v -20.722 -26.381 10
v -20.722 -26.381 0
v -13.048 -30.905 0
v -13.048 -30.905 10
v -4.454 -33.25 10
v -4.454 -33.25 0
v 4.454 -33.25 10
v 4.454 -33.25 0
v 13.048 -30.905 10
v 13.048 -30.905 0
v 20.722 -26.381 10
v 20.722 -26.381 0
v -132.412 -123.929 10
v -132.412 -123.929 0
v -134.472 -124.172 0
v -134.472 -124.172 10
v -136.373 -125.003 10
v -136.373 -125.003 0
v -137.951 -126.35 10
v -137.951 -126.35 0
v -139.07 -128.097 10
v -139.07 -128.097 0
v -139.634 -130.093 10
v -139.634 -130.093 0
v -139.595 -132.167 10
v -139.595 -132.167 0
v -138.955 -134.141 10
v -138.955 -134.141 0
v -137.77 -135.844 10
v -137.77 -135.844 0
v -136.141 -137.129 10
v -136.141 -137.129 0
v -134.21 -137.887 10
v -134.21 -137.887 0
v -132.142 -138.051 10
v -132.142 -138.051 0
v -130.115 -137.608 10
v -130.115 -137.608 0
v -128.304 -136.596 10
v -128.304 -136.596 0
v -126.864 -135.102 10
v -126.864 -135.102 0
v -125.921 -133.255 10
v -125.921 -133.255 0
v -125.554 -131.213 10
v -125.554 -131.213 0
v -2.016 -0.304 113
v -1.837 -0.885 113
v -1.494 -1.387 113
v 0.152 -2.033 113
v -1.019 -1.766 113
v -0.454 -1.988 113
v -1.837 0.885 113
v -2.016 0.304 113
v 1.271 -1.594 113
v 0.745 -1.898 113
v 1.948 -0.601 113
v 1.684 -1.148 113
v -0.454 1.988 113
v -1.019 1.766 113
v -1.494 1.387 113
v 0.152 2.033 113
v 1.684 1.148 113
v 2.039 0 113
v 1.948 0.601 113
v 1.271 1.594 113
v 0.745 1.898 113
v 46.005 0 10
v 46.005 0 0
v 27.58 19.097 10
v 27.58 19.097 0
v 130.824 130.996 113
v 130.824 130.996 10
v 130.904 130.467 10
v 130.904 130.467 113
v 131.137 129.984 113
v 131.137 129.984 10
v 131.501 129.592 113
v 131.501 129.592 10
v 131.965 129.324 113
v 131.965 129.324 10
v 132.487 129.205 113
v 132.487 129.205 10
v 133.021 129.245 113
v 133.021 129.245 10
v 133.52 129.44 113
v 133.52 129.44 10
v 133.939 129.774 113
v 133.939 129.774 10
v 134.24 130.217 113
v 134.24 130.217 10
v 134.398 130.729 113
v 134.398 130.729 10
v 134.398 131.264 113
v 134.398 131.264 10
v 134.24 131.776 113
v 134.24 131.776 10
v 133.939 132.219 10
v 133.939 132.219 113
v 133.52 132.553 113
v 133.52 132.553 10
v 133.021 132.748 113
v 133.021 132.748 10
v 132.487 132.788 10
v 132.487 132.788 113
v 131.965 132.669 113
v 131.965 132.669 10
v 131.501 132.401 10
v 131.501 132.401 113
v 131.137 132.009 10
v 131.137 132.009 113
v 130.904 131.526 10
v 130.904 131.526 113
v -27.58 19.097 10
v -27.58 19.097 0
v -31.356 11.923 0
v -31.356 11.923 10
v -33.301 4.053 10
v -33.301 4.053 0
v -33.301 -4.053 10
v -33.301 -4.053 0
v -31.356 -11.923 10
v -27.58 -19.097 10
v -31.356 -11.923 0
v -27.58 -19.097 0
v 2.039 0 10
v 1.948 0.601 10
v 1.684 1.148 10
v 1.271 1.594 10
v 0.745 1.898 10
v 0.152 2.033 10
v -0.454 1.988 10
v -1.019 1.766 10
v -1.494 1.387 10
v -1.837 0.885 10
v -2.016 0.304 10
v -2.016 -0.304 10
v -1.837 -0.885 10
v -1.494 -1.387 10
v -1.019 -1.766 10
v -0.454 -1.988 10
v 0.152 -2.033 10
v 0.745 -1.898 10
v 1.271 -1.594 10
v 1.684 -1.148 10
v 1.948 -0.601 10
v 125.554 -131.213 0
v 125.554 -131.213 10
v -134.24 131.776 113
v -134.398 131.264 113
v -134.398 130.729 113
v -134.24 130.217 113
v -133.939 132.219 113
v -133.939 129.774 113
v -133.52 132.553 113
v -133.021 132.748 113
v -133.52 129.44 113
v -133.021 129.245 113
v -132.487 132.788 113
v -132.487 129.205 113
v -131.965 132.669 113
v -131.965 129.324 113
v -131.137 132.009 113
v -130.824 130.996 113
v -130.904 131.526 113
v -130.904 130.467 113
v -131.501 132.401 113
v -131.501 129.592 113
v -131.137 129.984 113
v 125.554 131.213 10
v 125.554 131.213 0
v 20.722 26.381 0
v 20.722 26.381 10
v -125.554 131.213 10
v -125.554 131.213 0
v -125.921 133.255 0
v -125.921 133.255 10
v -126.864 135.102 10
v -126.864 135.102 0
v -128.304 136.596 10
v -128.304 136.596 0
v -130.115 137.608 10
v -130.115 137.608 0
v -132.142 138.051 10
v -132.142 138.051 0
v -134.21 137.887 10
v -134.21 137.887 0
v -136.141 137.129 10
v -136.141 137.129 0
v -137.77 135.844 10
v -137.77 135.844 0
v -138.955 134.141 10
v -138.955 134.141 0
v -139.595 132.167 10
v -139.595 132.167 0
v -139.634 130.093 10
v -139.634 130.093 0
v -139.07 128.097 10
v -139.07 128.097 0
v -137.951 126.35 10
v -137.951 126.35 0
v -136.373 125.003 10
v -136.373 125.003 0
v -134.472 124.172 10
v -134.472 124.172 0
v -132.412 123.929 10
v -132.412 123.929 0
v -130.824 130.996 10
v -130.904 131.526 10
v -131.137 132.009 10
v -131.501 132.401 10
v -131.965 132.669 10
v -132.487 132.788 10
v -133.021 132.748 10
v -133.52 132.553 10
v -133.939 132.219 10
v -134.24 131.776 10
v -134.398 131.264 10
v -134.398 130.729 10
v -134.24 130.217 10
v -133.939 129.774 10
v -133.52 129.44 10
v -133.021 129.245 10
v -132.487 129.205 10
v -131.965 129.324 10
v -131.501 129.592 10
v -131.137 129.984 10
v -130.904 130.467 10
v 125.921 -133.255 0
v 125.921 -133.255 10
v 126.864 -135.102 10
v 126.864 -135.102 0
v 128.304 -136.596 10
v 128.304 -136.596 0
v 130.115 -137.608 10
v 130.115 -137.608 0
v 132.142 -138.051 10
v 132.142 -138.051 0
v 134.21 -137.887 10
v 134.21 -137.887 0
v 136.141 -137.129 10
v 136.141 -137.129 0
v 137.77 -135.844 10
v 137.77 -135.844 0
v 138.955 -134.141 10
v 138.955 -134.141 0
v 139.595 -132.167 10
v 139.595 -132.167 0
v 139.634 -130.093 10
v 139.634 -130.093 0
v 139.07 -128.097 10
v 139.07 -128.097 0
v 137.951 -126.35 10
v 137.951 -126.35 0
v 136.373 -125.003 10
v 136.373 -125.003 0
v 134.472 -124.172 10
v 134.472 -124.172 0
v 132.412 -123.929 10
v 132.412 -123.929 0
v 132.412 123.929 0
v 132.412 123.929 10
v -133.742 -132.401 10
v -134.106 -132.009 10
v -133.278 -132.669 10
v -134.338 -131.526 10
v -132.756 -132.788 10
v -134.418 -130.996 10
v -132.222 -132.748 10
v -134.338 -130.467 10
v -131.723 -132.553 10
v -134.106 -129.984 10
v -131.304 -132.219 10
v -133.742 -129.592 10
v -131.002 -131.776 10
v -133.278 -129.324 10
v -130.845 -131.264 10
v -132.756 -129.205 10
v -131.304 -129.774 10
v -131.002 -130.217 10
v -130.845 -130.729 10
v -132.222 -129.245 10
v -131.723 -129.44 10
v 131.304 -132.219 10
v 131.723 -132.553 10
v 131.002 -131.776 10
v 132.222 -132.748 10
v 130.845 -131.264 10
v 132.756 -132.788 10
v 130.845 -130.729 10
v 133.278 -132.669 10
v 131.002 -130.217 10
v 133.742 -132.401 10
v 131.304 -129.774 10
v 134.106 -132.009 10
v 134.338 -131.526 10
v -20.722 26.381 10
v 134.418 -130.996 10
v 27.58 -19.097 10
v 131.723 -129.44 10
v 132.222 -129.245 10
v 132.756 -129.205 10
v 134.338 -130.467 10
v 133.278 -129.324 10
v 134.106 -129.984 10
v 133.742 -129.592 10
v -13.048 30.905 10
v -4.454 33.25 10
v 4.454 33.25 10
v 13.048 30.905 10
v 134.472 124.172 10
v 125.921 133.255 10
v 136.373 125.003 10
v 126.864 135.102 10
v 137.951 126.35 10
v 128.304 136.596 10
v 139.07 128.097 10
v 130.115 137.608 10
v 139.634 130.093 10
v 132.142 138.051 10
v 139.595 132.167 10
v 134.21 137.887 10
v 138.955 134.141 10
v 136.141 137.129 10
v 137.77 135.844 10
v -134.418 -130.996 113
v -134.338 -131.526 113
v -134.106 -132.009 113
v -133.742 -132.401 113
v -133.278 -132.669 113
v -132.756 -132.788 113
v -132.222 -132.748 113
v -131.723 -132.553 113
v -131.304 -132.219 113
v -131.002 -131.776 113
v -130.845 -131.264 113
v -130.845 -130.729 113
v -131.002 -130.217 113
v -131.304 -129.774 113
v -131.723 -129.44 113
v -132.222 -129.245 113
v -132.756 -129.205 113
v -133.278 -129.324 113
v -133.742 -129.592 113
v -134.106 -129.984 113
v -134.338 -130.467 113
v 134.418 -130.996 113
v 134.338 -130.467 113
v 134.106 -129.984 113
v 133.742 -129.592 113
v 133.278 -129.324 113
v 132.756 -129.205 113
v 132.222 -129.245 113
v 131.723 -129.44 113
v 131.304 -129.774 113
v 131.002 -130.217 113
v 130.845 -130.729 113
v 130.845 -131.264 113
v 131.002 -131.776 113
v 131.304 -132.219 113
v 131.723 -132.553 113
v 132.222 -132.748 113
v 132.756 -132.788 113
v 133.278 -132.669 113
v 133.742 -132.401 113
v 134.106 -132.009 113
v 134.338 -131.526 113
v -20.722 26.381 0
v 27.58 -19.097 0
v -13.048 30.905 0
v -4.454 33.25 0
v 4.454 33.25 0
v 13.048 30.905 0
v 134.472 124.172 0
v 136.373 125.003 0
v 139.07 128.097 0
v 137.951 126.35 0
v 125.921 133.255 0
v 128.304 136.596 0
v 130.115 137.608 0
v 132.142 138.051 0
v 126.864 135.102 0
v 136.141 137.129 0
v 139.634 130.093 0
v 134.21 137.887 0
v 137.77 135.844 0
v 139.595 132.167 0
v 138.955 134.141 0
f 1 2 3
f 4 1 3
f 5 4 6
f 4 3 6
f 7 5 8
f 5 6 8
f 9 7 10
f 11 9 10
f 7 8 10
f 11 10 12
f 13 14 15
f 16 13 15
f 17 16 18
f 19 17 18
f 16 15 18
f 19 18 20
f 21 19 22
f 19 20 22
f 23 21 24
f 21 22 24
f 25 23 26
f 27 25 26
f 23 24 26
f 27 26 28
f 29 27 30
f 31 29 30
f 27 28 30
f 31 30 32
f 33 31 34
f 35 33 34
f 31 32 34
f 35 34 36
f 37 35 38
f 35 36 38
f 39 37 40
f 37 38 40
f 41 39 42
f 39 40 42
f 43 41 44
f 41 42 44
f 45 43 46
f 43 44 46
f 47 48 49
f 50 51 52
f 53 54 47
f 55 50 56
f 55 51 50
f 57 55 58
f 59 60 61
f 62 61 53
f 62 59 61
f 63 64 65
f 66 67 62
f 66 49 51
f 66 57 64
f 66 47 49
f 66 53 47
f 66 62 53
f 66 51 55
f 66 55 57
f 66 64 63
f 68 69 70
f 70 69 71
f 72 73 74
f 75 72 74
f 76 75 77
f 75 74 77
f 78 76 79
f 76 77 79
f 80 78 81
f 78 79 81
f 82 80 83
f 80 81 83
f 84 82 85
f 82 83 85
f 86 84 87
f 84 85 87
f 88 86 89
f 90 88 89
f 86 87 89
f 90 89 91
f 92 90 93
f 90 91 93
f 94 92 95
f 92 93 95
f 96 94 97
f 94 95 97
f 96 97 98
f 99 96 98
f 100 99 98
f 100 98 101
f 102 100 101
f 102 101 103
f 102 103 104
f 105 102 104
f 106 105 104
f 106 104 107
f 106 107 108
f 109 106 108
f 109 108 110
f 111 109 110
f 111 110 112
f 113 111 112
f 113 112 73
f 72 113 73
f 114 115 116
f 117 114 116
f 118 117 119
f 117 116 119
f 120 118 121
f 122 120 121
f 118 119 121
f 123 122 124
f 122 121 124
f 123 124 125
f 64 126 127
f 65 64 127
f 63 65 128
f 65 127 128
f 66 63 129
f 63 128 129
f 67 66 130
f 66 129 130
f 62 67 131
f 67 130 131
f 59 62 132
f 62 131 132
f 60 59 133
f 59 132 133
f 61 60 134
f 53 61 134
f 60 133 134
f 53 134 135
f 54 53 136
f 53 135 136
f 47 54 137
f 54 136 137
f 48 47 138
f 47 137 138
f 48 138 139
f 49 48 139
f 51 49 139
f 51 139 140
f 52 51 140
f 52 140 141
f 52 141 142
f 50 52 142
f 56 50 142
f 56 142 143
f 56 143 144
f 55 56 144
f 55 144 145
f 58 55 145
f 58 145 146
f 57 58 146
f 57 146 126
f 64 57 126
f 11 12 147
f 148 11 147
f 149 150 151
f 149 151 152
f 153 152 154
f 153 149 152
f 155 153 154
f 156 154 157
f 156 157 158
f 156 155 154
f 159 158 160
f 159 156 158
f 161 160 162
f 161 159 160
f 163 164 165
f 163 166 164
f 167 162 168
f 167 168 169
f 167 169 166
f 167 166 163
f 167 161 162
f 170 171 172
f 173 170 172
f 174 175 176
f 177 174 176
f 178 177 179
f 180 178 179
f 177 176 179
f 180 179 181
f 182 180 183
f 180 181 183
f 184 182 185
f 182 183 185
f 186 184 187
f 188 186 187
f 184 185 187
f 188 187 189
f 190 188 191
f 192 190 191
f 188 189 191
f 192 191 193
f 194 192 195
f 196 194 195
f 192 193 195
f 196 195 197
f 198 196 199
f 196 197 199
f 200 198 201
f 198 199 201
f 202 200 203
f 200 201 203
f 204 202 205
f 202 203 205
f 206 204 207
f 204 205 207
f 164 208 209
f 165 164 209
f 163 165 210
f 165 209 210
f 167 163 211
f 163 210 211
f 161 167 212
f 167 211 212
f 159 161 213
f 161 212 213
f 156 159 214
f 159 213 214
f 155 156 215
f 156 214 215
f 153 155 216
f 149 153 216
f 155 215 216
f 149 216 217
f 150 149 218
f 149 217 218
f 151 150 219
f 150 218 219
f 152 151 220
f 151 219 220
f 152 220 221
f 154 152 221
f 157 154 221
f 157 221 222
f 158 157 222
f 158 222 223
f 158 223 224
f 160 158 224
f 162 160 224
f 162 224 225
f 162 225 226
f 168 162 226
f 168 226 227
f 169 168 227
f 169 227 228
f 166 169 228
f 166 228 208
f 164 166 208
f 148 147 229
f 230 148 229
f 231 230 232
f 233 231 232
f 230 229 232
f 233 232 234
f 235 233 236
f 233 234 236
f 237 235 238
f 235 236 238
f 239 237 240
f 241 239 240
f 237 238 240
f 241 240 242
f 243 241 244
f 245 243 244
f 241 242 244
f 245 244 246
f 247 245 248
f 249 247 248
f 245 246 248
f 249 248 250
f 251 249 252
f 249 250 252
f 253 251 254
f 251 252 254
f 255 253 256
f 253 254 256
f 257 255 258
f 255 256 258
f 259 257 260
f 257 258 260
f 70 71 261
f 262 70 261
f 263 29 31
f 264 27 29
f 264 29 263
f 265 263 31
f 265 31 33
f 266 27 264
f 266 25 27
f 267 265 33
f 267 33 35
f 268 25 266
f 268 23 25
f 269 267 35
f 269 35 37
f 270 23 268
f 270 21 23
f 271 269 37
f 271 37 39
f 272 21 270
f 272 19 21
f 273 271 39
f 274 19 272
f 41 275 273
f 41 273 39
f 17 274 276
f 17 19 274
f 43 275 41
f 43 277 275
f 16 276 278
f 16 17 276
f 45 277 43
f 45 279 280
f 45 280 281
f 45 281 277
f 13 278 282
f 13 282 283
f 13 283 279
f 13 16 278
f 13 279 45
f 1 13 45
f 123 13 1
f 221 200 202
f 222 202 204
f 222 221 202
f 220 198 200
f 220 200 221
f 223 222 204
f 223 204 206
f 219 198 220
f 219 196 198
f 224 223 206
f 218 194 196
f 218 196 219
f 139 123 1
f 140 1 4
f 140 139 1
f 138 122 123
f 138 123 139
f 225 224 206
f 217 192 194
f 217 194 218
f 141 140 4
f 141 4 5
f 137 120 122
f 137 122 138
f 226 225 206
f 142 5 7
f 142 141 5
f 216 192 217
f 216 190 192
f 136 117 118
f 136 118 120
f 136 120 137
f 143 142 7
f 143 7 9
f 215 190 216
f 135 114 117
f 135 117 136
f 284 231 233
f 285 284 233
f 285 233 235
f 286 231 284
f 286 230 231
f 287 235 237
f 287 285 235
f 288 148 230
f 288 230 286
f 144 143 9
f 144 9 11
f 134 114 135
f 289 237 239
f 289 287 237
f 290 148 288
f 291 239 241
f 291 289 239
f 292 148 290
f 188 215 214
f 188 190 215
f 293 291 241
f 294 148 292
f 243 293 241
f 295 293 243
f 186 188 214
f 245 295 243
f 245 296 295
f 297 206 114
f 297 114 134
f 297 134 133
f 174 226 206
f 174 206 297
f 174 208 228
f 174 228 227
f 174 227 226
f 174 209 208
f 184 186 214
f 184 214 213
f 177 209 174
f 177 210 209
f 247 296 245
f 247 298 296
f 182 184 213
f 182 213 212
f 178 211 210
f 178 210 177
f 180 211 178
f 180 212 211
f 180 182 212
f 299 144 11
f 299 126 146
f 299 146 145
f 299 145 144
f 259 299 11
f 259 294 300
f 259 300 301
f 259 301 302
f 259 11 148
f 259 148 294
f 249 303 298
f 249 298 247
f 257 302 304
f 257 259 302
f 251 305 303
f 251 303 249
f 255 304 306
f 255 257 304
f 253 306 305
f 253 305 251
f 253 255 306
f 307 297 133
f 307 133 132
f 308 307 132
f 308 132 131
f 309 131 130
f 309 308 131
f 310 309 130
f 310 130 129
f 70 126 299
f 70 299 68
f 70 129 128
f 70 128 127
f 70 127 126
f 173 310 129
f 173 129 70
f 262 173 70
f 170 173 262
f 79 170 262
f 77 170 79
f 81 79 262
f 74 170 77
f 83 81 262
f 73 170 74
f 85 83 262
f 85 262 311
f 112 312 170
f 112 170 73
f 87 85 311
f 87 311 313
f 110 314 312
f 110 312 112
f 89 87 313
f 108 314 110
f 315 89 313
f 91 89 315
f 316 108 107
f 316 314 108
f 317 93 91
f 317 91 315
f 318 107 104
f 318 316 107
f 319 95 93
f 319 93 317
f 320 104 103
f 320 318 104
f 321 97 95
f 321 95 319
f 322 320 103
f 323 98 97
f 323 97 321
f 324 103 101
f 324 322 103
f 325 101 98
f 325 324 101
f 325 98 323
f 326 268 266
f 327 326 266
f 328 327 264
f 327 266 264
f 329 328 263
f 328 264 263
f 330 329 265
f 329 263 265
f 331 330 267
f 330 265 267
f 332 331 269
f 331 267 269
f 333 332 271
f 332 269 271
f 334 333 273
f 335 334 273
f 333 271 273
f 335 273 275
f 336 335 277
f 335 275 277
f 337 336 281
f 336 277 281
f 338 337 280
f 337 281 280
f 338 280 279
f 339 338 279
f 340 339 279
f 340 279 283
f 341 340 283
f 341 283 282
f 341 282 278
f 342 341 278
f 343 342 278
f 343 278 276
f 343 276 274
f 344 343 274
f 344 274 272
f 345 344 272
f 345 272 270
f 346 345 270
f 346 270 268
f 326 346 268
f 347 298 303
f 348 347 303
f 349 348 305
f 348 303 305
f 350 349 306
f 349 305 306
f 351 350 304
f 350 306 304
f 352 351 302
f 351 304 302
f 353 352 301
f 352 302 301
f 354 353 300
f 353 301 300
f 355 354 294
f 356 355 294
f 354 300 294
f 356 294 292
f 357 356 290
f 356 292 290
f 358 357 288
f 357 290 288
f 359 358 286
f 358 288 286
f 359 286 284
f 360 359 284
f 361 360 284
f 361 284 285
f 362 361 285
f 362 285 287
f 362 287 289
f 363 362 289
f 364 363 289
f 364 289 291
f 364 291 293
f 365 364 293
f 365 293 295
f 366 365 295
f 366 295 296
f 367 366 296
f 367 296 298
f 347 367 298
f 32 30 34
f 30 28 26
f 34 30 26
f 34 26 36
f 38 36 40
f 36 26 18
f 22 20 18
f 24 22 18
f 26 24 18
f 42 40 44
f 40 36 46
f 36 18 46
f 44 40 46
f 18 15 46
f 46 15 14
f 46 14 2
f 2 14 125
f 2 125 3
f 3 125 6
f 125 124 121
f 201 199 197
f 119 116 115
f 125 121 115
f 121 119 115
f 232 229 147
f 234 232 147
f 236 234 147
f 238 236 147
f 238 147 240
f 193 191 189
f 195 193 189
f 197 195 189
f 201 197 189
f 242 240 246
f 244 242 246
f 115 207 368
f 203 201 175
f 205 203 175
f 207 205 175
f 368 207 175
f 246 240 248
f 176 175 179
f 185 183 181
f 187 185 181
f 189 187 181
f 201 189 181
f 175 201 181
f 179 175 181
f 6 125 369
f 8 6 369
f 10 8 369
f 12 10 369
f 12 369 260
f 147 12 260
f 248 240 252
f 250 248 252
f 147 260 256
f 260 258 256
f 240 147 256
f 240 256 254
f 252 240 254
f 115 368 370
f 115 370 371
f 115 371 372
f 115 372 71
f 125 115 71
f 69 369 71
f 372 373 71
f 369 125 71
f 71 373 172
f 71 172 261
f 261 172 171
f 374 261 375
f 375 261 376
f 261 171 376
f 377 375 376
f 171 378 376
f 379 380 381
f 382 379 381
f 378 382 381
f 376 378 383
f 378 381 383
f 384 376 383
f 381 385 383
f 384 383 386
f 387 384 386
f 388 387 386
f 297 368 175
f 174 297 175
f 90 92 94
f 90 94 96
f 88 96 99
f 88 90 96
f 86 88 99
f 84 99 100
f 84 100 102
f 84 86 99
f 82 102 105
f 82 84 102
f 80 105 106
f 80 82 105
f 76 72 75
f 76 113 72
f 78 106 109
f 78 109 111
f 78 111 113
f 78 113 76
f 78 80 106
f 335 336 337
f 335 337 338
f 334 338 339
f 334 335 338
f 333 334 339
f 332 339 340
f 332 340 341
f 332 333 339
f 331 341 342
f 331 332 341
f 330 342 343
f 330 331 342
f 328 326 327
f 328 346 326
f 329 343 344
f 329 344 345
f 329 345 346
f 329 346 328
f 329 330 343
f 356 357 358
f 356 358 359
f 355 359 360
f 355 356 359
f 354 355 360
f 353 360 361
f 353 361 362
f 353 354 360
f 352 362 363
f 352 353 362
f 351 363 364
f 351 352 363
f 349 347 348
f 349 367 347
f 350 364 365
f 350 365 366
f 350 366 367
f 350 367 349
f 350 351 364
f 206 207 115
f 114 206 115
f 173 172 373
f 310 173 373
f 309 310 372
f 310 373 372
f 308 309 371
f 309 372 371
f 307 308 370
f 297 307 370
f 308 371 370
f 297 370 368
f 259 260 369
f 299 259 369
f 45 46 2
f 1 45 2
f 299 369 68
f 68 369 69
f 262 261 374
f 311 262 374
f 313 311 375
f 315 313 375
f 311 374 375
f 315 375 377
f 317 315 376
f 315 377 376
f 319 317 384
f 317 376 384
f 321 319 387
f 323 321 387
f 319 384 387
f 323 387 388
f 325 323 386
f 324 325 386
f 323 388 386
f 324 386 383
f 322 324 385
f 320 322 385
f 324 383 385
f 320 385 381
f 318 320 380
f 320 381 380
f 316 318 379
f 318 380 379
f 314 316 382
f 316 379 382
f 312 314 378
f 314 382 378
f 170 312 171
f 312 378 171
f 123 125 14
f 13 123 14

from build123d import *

# Parameters (mm, degrees)
BOSS_EXTRUDE1_DEPTH = 10
SKETCH3_R           = 1.796885627
SKETCH3_R_2         = 2.038704301
BOSS_EXTRUDE2_DEPTH = 113


with BuildPart() as part:
    # Sketch2 → Boss-Extrude1 (new body)
    with BuildSketch(Plane.XY):
        with BuildLine():
            Line((-20.72228509, 26.381237071), (-125.55357923, 131.212531212))
            ThreePointArc((-125.55357923, 131.212531212), (-137.769587184, 135.843703419), (-132.41170091, 123.928517268))
            Line((-132.41170091, 123.928517268), (-27.580406769, 19.097223127))
            ThreePointArc((-27.580406769, 19.097223127), (-33.546725157, 0), (-27.580406769, -19.097223127))
            Line((-27.580406769, -19.097223127), (-132.41170091, -123.928517268))
            ThreePointArc((-132.41170091, -123.928517268), (-137.769587184, -135.843703419), (-125.55357923, -131.212531212))
            Line((-125.55357923, -131.212531212), (-20.72228509, -26.381237071))
            ThreePointArc((-20.72228509, -26.381237071), (0, -33.546725157), (20.72228509, -26.381237071))
            Line((20.72228509, -26.381237071), (125.55357923, -131.212531212))
            ThreePointArc((125.55357923, -131.212531212), (137.769587184, -135.843703419), (132.41170091, -123.928517268))
            Line((132.41170091, -123.928517268), (27.580406769, -19.097223127))
            Line((27.580406769, -19.097223127), (46.005003751, 0))
            Line((46.005003751, 0), (27.580406769, 19.097223127))
            Line((27.580406769, 19.097223127), (132.41170091, 123.928517268))
            ThreePointArc((132.41170091, 123.928517268), (137.769587184, 135.843703419), (125.55357923, 131.212531212))
            Line((125.55357923, 131.212531212), (20.72228509, 26.381237071))
            ThreePointArc((20.72228509, 26.381237071), (0, 33.546725157), (-20.72228509, 26.381237071))
        make_face()
    extrude(amount=BOSS_EXTRUDE1_DEPTH)

    # Sketch3 → Boss-Extrude2 (add)
    with BuildSketch(Plane.XY):
        with Locations((-132.621345525, 130.996476601)):
            Circle(SKETCH3_R)
        with Locations(Location((132.621345525, 130.996476601, 0), (0, 0, 180))):
            Circle(SKETCH3_R)
        with Locations((132.621345525, -130.996476601)):
            Circle(SKETCH3_R)
        with Locations(Location((-132.621345525, -130.996476601, 0), (0, 0, 180))):
            Circle(SKETCH3_R)
        Circle(SKETCH3_R_2)
    extrude(amount=BOSS_EXTRUDE2_DEPTH)


solid = part.part
